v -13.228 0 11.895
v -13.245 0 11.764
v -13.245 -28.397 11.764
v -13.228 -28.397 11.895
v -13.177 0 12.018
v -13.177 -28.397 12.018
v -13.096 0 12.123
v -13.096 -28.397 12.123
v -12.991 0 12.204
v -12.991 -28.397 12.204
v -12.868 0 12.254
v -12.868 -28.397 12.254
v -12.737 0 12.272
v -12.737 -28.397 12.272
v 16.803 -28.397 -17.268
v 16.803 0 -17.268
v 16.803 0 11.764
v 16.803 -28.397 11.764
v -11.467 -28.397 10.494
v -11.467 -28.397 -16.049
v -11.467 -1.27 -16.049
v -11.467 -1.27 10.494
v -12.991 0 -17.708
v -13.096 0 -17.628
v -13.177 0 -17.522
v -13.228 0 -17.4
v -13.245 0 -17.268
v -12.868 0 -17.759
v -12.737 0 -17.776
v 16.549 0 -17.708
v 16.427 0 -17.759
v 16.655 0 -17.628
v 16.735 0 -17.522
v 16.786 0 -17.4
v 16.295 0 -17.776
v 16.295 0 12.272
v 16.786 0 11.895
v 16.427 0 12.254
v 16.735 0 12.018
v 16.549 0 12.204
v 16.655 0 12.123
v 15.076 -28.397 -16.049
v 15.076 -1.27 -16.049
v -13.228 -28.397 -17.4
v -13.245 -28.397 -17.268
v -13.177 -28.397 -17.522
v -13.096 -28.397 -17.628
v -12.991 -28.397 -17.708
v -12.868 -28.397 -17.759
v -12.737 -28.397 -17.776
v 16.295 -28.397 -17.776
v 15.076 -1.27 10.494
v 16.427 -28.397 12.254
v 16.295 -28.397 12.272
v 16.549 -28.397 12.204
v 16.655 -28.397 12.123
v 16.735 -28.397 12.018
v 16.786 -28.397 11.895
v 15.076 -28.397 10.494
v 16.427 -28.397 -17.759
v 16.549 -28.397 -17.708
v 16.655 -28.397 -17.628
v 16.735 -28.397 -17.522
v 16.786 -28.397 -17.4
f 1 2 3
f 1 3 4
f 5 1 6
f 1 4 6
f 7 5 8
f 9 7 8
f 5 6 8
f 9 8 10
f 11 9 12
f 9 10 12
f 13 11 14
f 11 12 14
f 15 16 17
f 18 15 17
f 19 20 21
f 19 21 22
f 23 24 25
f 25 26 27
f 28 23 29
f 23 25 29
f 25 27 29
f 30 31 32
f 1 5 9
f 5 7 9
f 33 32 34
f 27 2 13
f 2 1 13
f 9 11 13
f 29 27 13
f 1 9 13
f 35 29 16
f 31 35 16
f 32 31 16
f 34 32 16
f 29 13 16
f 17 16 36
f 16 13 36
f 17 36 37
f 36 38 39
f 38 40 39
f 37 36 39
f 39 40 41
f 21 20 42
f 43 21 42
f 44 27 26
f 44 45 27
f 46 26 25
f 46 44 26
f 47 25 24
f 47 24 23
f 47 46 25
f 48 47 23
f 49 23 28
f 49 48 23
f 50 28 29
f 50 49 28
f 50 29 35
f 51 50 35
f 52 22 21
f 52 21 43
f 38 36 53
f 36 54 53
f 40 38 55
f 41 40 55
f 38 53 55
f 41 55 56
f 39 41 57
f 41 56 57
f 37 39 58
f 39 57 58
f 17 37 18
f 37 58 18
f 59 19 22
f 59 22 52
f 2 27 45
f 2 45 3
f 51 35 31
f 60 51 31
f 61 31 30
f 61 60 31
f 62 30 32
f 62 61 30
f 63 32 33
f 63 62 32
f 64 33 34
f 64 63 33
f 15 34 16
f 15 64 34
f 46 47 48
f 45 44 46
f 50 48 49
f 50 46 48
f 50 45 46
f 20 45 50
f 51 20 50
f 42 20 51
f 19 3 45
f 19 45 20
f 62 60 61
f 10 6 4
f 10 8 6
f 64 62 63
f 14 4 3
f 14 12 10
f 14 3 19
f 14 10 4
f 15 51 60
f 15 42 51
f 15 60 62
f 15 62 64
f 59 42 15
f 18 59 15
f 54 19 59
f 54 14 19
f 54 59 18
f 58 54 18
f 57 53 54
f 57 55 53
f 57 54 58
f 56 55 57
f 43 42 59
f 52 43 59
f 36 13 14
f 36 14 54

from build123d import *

# Parameters (mm, degrees)
F0_W     = 30.0482
F0_H     = 30.0482
F1_DEPTH = 28.3972
F2_W     = 26.543
F2_H     = 26.543
F3_DEPTH = 27.1272
F4_R     = 0.508


with BuildPart() as f1:
    # F0 (on Front) → F1 (new body)
    with BuildSketch(Plane.XZ):
        with Locations((1.779277, -2.752393)):
            Rectangle(F0_W, F0_H)
    extrude(amount=F1_DEPTH)

    # F2 (on face) → F3 (cut)
    with BuildSketch(Plane.XZ.offset(28.3972)):
        with Locations((1.804677, -2.777793)):
            Rectangle(F2_W, F2_H)
    extrude(amount=-F3_DEPTH, mode=Mode.SUBTRACT)

    # F4
    f4_edges = [f1.edges().sort_by_distance(p)[0] for p in [
        (-13.244823, -14.1986, 12.271707),
        (-13.244823, -14.1986, -17.776493),
        (16.803377, -14.1986, 12.271707),
        (16.803377, -14.1986, -17.776493),
    ]]
    fillet(f4_edges, radius=F4_R)


solid = f1.part
